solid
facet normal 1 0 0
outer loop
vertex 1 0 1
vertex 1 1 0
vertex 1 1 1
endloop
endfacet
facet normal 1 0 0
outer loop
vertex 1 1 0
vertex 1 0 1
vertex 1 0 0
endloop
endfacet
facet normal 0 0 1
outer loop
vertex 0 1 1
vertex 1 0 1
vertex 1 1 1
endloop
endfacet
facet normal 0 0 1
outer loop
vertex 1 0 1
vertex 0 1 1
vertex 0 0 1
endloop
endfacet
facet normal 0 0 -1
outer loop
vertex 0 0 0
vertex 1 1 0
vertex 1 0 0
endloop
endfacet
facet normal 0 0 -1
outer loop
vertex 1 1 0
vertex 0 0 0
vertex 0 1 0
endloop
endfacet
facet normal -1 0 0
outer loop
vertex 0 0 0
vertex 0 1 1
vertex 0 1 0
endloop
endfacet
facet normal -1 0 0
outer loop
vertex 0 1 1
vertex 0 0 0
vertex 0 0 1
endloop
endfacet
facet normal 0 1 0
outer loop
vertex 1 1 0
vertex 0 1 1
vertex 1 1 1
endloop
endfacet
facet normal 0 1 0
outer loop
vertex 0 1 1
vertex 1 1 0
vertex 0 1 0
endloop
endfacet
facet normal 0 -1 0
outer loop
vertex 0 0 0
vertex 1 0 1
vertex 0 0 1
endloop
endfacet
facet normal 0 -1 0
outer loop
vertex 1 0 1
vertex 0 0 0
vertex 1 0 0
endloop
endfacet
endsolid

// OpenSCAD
color([1, 0, 0]) cube();
color([1, 0, 0, 0.5]) cube();
color(c = [0.1, 0.2, 0.3], alpha = 0.4) cube();
color([1, 0, 0], 0.25) cube();
color([0.5, 0.5]) cube();
